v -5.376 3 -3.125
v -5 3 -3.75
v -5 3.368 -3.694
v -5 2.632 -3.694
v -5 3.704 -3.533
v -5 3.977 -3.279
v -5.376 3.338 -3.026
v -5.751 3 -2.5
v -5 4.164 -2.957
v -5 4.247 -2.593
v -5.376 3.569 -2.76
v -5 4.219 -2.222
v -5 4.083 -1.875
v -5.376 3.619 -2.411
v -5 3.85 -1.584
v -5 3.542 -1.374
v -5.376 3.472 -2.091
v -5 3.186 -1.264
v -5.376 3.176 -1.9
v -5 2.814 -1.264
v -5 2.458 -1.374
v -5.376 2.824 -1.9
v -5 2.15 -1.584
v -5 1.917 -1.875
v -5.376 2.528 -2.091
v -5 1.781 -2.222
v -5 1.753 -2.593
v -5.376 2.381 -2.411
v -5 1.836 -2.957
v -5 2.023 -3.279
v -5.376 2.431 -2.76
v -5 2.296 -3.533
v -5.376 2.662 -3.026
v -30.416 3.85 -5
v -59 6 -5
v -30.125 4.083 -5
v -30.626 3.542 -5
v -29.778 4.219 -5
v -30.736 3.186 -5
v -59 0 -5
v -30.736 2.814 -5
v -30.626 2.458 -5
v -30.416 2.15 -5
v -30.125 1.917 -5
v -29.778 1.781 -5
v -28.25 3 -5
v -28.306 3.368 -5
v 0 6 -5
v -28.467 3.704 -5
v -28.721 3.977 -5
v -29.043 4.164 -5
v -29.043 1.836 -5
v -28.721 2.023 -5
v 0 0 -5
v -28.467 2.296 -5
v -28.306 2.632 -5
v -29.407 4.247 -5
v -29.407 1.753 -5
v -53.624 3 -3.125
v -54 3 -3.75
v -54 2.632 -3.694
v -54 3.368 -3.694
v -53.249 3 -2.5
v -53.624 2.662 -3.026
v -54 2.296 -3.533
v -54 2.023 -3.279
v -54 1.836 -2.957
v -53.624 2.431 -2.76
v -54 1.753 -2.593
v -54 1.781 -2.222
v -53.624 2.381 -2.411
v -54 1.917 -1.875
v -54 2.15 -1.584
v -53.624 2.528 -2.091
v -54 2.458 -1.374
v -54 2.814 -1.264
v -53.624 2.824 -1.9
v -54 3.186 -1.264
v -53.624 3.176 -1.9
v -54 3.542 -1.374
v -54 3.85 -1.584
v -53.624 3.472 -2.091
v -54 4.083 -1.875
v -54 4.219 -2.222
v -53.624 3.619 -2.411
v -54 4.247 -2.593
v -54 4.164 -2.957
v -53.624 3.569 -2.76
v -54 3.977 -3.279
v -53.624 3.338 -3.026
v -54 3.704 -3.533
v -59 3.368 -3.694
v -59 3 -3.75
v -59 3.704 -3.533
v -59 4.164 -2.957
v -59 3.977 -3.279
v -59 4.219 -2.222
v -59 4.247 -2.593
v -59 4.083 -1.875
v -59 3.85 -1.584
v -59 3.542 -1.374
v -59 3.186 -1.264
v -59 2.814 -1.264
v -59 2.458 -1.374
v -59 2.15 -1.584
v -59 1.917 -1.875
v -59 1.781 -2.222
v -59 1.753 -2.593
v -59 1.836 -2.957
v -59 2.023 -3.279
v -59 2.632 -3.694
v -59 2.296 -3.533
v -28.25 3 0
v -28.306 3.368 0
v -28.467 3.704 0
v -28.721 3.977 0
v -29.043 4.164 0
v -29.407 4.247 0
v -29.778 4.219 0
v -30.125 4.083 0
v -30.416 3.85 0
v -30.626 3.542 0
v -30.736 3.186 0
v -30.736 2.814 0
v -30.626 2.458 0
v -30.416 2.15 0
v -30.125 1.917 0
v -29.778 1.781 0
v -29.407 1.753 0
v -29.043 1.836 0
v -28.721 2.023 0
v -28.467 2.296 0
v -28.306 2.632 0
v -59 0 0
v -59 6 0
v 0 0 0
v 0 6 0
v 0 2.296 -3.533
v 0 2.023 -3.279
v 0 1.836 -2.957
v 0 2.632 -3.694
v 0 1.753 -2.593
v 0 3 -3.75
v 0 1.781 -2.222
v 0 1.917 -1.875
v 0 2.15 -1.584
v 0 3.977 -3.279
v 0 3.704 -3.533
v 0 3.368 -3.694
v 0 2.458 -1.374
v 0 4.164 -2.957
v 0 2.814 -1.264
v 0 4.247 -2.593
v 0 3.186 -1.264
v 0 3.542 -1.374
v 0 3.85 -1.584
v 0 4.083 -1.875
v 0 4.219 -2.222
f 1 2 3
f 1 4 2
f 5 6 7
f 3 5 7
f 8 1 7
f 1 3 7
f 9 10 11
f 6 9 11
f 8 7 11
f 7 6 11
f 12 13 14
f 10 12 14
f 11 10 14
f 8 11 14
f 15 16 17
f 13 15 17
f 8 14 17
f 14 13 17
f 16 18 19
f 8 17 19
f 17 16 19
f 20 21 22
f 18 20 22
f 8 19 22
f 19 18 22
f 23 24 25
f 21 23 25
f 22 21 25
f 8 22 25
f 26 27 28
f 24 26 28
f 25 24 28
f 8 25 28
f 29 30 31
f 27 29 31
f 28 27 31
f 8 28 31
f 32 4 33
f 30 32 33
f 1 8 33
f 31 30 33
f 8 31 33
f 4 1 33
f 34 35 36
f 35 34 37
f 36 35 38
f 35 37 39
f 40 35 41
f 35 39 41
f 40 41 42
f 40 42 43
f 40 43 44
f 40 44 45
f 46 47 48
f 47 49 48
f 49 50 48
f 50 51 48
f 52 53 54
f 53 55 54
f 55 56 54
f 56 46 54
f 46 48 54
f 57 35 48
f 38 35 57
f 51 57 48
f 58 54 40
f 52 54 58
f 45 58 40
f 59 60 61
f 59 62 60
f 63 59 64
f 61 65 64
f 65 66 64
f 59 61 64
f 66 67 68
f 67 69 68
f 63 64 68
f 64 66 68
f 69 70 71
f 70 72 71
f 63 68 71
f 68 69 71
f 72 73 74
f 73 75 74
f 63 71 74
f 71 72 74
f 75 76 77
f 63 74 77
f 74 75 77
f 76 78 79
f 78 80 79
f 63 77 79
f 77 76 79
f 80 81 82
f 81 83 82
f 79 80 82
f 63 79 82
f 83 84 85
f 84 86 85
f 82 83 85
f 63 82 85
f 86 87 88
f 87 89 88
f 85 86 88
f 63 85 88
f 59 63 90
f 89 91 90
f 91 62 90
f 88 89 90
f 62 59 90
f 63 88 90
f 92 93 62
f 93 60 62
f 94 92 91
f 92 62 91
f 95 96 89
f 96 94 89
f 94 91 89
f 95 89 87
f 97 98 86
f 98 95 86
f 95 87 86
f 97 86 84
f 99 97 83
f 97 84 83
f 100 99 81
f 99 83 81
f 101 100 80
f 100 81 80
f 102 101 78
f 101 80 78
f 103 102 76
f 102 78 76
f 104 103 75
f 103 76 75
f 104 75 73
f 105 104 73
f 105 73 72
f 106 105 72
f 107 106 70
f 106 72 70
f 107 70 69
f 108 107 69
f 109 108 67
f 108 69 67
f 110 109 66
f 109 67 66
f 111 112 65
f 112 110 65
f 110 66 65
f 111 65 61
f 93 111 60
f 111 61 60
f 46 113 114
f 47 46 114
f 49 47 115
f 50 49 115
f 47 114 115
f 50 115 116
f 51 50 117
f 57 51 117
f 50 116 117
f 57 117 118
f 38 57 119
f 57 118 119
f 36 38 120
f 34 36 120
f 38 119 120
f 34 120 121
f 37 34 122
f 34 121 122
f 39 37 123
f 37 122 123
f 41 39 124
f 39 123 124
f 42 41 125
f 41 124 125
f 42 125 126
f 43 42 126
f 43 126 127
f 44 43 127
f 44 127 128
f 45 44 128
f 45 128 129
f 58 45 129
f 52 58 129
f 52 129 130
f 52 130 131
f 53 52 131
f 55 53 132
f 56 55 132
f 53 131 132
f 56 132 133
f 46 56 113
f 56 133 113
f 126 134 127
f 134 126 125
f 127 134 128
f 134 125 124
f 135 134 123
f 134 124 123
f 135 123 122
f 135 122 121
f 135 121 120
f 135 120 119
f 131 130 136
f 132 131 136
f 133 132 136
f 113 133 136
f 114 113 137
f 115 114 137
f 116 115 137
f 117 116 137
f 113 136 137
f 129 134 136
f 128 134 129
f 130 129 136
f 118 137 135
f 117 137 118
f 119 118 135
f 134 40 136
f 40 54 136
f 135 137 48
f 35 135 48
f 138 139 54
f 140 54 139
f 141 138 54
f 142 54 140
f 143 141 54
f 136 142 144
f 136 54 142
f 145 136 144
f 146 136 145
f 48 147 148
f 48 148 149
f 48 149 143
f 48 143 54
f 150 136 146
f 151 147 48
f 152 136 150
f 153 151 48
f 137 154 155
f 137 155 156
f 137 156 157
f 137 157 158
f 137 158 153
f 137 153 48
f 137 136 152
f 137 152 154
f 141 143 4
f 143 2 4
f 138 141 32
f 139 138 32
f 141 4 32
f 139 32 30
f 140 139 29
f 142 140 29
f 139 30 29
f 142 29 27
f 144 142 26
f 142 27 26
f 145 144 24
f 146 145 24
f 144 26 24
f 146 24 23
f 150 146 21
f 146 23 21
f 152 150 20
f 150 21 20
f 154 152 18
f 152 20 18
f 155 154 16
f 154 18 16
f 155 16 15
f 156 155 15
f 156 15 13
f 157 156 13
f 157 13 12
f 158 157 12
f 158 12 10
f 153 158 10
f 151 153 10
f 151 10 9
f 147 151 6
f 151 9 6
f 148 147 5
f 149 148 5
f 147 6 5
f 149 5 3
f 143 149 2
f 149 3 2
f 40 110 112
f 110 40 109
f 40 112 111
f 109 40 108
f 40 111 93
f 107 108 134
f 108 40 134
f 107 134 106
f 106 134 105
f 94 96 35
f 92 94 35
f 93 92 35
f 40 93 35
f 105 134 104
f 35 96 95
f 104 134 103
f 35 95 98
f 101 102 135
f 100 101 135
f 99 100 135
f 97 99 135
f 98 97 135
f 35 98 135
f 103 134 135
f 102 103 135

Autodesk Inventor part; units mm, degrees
ref_plane "YZ Plane" through (0, 0, 0) normal (1, 0, 0) x (0, 1, 0)
ref_plane "XZ Plane" through (0, 0, 0) normal (0, 1, 0) x (-1, 0, 0)
sketch "スケッチ1" plane through (0, 0, 0) normal (1, 0, 0) x (0, 1, 0)
  line L0 (0, 0) -> (6, 0)
  line L1 (6, 0) -> (6, -5)
  line L2 (6, -5) -> (0, -5)
  line L3 (0, -5) -> (0, 0)
  point P0 (3, -2.5)
  dimension "d0" = 6
  dimension "d1" = 5
  dimension "d2" = 3
  dimension "d3" = 2.5
extrude "押し出し1" add sketch "スケッチ1" against normal blind 59
ref_plane "作業平面1" through (-29.5, 0, 0) normal (1, 0, 0) x (0, 0, -1)
hole "穴1" at (0, 3, -2.5) direction (-1, 0, 0) diameter 2.5 depth 5 tip angle 118
mirror "ミラー1" about plane through (-29.5, 0, 0) normal (1, 0, 0) of "穴1"
sketch "スケッチ2" plane through (0, 0, 0) normal (0, 0, 1) x (1, 0, 0)
  circle A0 centre (-29.5, 3) radius 1.25
  line L0 (0, 6) -> (-59, 6) projected
  line L1 (0, 6) -> (0, 0) projected
  dimension "d14" = 2.5
  dimension "d15" = 3
  dimension "d16" = 29.5
extrude "押し出し2" cut sketch "スケッチ2" against normal blind 59
properties part number "belt_liner_v2_Plate_7" material "アルミニウム 6061"
